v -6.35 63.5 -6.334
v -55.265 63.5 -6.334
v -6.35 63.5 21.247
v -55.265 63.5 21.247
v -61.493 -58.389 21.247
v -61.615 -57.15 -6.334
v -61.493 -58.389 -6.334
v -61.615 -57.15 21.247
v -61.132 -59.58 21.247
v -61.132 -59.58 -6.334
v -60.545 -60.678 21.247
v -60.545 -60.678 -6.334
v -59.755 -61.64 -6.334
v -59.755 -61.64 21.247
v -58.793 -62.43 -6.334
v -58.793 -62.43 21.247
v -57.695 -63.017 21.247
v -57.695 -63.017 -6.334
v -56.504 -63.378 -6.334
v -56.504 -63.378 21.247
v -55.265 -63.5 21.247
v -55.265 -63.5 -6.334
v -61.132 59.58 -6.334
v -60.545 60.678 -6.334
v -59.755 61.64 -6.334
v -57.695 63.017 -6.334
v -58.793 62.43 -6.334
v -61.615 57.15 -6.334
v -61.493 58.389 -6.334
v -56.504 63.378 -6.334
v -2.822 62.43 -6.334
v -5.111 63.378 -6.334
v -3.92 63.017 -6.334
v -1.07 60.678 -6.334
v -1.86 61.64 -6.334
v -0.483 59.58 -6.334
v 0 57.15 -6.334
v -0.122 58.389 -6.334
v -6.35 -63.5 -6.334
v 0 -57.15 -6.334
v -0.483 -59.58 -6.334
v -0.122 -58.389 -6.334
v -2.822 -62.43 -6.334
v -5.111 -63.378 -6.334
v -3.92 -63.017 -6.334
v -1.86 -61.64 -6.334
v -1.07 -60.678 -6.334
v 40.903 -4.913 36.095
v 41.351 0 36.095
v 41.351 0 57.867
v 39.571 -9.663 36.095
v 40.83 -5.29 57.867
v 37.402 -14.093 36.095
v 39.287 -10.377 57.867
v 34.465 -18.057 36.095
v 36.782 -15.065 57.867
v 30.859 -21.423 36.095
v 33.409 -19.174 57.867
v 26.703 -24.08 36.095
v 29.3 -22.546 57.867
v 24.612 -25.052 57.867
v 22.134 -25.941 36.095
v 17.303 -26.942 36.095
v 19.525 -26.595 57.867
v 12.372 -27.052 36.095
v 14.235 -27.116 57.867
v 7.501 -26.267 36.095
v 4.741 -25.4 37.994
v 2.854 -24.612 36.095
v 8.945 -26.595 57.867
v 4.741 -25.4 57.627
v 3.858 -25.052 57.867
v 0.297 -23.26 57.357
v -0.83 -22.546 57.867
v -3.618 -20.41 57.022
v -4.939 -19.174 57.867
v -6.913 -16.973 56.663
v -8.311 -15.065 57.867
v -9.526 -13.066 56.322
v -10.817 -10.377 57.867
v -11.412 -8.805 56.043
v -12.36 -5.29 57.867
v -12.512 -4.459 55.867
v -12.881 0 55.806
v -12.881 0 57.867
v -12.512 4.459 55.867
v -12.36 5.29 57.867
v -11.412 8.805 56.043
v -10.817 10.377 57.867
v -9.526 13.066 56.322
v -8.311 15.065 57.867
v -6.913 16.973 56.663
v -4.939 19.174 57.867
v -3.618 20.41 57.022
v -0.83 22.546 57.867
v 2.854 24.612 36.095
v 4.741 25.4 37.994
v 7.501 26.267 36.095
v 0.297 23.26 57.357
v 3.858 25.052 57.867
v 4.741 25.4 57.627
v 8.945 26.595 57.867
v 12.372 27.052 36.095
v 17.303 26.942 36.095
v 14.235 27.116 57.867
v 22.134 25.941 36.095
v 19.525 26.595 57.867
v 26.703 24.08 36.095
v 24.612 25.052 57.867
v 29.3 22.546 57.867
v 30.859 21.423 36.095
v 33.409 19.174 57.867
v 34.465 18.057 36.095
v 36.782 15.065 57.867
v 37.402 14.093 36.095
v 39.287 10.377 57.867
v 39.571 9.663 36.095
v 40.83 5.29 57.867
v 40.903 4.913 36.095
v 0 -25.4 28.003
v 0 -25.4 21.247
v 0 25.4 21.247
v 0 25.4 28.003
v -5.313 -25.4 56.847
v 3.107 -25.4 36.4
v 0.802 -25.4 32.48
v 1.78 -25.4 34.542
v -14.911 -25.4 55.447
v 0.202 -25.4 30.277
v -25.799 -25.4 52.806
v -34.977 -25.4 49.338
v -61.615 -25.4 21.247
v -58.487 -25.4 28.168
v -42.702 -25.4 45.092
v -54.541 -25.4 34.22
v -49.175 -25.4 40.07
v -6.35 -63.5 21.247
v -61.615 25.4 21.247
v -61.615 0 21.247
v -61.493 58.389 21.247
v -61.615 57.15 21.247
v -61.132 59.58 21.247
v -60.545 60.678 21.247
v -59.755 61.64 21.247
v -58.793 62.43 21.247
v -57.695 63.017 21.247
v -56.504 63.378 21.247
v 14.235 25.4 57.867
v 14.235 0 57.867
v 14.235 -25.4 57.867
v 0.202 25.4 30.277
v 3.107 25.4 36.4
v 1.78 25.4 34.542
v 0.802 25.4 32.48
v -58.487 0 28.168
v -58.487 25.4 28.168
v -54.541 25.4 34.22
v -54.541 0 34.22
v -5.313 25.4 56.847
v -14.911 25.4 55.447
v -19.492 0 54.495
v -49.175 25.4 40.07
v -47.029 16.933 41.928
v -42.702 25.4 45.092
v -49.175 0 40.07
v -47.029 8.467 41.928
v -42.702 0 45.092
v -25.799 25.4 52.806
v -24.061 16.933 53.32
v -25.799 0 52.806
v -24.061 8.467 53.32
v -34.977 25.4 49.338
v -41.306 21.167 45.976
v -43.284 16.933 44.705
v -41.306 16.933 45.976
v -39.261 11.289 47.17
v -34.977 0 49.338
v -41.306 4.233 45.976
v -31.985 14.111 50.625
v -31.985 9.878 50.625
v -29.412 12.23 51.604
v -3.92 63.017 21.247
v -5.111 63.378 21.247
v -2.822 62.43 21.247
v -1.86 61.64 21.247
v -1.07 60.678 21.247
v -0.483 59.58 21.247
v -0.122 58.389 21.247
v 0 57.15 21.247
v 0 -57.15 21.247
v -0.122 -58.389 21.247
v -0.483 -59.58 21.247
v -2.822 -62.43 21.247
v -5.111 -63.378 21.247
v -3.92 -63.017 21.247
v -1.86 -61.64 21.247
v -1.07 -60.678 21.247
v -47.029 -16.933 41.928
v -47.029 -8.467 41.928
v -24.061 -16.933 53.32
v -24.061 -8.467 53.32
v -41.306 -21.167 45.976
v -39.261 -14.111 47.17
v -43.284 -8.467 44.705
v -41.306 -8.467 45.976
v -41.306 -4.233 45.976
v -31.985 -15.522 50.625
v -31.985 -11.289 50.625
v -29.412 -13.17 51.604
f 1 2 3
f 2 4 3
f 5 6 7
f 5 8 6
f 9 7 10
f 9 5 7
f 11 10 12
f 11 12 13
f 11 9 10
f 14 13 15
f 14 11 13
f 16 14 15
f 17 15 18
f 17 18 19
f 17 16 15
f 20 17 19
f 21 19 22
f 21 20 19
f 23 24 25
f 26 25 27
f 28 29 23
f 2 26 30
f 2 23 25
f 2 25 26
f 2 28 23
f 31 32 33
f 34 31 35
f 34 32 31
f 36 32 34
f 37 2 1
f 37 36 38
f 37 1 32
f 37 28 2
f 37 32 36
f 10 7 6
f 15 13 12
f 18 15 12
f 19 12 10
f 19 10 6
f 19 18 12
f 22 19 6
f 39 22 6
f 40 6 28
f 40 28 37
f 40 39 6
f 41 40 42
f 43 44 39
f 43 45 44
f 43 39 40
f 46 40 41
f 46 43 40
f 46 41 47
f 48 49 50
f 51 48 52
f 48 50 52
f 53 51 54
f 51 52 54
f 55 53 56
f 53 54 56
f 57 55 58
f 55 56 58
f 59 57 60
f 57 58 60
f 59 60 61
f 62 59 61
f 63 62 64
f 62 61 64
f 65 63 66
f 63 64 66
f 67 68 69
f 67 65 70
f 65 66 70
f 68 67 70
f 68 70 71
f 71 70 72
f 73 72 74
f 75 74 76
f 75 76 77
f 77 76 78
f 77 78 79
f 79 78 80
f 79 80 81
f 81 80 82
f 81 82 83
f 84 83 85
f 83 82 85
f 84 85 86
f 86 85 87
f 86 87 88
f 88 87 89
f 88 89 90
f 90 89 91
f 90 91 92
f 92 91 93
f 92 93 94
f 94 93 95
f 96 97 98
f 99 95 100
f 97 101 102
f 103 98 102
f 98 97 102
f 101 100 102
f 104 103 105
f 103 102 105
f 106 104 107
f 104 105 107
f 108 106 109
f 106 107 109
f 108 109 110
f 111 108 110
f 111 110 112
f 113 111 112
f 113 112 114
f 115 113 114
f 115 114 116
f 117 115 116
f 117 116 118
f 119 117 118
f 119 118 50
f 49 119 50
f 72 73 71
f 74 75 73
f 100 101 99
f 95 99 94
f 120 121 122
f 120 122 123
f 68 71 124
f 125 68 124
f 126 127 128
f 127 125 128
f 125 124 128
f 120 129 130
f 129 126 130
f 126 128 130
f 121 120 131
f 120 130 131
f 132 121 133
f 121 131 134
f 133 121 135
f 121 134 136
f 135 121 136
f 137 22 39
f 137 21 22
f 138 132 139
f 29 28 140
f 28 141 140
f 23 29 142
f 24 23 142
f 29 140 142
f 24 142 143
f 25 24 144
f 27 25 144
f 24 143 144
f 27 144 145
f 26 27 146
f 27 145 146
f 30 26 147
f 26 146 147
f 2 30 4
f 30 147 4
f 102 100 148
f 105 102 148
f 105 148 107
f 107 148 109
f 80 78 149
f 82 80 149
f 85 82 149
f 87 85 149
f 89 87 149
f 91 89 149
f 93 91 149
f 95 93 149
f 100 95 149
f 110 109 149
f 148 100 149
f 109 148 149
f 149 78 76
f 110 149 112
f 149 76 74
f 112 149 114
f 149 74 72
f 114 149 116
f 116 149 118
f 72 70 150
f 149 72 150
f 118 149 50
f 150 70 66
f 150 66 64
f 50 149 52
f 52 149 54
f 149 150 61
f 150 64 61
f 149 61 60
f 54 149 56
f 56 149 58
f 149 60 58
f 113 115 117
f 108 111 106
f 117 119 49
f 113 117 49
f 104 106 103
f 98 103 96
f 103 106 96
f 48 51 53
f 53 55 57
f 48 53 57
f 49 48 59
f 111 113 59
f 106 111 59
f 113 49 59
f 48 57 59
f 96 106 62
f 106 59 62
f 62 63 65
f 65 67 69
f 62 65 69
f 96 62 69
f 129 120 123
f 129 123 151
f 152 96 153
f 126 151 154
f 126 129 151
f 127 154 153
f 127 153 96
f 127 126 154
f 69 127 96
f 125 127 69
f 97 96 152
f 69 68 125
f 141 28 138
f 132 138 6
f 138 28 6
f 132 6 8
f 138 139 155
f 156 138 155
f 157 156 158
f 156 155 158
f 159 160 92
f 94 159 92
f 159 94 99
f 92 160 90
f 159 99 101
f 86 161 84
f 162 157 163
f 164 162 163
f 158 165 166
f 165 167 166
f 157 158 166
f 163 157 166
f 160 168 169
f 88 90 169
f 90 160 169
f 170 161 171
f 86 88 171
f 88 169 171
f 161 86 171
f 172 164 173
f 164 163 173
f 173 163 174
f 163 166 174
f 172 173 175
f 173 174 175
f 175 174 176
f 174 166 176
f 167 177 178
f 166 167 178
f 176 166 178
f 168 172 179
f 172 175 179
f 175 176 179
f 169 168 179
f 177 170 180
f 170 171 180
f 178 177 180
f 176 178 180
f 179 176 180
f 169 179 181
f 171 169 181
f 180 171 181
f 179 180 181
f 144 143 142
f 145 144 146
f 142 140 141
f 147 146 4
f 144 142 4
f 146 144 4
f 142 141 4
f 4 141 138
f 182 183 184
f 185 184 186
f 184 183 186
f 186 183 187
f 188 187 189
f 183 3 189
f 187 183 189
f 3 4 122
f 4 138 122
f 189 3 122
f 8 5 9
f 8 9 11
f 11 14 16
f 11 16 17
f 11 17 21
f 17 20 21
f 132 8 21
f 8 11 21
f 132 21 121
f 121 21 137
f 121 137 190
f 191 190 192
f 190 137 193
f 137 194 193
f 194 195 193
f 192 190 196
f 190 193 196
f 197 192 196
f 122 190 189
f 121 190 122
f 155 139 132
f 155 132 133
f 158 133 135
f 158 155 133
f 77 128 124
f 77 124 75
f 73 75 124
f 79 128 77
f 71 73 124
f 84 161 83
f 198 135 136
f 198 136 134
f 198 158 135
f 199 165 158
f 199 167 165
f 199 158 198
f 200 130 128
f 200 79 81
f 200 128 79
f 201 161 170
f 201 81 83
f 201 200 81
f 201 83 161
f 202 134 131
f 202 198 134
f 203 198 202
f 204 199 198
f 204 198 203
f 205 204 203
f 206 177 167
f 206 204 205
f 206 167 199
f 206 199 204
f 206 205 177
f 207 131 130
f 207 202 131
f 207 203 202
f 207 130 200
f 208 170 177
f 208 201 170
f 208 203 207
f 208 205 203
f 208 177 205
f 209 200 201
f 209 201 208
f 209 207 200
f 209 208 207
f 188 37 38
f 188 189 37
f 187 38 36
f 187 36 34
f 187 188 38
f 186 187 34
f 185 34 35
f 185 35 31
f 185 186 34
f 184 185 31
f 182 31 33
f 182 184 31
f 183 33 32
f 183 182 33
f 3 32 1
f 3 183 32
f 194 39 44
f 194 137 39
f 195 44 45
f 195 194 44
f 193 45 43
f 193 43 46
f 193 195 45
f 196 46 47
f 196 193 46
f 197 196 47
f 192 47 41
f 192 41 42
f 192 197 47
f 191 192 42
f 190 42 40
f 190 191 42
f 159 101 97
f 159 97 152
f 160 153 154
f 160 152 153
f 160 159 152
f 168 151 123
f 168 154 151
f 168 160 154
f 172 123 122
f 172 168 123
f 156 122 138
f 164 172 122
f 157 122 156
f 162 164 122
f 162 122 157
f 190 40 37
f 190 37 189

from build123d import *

# Parameters (mm, degrees)
F0_W     = 61.615169
F0_H     = 27.580866
F1_DEPTH = 63.5
F2_DEPTH = 25.4
F4_R     = 6.35


with BuildPart() as f1:
    # F0 (on Front) → F1 (new body, symmetric)
    with BuildSketch(Plane.XZ):
        with Locations((-30.807584, 7.456179)):
            Rectangle(F0_W, F0_H)
    extrude(amount=F1_DEPTH, both=True)

    # F0 (on Front) → F2 (join, symmetric)
    with BuildSketch(Plane.XZ):
        with BuildLine():
            add(Edge.make_bspline(
                [(-61.615169, 21.246612), (-51.106244, 49.939442), (-20.719279, 57.734624), (14.235076, 57.867013)],
                knots=[0, 0, 0, 0, 84.227748, 84.227748, 84.227748, 84.227748], degree=3))
            Line((-61.615169, 21.246612), (0, 21.246612))
            Line((0, 21.246612), (0, 28.003424))
            ThreePointArc((0, 28.003424), (4.263451, 37.58451), (14.235076, 40.831182))
            Line((14.235076, 40.831182), (14.235076, 57.867013))
        make_face()
    extrude(amount=F2_DEPTH, both=True)

    # F0 (on Front) → F3 (revolve)
    with BuildSketch(Plane.XZ):
        Polygon((41.351497, 57.867013), (14.235076, 57.867013), (14.235076, 40.831182), (14.235076, 36.095049), (41.351497, 36.095049), align=None)
    revolve(axis=Axis((14.235076, 0, 46.981031), (0, 0, -1)))

    # F4
    f4_edges = [f1.edges().sort_by_distance(p)[0] for p in [
        (0, -63.5, 7.456179),
        (-61.615169, -63.5, 7.456179),
        (0, 63.5, 7.456179),
        (-61.615169, 63.5, 7.456179),
    ]]
    fillet(f4_edges, radius=F4_R)


solid = f1.part
